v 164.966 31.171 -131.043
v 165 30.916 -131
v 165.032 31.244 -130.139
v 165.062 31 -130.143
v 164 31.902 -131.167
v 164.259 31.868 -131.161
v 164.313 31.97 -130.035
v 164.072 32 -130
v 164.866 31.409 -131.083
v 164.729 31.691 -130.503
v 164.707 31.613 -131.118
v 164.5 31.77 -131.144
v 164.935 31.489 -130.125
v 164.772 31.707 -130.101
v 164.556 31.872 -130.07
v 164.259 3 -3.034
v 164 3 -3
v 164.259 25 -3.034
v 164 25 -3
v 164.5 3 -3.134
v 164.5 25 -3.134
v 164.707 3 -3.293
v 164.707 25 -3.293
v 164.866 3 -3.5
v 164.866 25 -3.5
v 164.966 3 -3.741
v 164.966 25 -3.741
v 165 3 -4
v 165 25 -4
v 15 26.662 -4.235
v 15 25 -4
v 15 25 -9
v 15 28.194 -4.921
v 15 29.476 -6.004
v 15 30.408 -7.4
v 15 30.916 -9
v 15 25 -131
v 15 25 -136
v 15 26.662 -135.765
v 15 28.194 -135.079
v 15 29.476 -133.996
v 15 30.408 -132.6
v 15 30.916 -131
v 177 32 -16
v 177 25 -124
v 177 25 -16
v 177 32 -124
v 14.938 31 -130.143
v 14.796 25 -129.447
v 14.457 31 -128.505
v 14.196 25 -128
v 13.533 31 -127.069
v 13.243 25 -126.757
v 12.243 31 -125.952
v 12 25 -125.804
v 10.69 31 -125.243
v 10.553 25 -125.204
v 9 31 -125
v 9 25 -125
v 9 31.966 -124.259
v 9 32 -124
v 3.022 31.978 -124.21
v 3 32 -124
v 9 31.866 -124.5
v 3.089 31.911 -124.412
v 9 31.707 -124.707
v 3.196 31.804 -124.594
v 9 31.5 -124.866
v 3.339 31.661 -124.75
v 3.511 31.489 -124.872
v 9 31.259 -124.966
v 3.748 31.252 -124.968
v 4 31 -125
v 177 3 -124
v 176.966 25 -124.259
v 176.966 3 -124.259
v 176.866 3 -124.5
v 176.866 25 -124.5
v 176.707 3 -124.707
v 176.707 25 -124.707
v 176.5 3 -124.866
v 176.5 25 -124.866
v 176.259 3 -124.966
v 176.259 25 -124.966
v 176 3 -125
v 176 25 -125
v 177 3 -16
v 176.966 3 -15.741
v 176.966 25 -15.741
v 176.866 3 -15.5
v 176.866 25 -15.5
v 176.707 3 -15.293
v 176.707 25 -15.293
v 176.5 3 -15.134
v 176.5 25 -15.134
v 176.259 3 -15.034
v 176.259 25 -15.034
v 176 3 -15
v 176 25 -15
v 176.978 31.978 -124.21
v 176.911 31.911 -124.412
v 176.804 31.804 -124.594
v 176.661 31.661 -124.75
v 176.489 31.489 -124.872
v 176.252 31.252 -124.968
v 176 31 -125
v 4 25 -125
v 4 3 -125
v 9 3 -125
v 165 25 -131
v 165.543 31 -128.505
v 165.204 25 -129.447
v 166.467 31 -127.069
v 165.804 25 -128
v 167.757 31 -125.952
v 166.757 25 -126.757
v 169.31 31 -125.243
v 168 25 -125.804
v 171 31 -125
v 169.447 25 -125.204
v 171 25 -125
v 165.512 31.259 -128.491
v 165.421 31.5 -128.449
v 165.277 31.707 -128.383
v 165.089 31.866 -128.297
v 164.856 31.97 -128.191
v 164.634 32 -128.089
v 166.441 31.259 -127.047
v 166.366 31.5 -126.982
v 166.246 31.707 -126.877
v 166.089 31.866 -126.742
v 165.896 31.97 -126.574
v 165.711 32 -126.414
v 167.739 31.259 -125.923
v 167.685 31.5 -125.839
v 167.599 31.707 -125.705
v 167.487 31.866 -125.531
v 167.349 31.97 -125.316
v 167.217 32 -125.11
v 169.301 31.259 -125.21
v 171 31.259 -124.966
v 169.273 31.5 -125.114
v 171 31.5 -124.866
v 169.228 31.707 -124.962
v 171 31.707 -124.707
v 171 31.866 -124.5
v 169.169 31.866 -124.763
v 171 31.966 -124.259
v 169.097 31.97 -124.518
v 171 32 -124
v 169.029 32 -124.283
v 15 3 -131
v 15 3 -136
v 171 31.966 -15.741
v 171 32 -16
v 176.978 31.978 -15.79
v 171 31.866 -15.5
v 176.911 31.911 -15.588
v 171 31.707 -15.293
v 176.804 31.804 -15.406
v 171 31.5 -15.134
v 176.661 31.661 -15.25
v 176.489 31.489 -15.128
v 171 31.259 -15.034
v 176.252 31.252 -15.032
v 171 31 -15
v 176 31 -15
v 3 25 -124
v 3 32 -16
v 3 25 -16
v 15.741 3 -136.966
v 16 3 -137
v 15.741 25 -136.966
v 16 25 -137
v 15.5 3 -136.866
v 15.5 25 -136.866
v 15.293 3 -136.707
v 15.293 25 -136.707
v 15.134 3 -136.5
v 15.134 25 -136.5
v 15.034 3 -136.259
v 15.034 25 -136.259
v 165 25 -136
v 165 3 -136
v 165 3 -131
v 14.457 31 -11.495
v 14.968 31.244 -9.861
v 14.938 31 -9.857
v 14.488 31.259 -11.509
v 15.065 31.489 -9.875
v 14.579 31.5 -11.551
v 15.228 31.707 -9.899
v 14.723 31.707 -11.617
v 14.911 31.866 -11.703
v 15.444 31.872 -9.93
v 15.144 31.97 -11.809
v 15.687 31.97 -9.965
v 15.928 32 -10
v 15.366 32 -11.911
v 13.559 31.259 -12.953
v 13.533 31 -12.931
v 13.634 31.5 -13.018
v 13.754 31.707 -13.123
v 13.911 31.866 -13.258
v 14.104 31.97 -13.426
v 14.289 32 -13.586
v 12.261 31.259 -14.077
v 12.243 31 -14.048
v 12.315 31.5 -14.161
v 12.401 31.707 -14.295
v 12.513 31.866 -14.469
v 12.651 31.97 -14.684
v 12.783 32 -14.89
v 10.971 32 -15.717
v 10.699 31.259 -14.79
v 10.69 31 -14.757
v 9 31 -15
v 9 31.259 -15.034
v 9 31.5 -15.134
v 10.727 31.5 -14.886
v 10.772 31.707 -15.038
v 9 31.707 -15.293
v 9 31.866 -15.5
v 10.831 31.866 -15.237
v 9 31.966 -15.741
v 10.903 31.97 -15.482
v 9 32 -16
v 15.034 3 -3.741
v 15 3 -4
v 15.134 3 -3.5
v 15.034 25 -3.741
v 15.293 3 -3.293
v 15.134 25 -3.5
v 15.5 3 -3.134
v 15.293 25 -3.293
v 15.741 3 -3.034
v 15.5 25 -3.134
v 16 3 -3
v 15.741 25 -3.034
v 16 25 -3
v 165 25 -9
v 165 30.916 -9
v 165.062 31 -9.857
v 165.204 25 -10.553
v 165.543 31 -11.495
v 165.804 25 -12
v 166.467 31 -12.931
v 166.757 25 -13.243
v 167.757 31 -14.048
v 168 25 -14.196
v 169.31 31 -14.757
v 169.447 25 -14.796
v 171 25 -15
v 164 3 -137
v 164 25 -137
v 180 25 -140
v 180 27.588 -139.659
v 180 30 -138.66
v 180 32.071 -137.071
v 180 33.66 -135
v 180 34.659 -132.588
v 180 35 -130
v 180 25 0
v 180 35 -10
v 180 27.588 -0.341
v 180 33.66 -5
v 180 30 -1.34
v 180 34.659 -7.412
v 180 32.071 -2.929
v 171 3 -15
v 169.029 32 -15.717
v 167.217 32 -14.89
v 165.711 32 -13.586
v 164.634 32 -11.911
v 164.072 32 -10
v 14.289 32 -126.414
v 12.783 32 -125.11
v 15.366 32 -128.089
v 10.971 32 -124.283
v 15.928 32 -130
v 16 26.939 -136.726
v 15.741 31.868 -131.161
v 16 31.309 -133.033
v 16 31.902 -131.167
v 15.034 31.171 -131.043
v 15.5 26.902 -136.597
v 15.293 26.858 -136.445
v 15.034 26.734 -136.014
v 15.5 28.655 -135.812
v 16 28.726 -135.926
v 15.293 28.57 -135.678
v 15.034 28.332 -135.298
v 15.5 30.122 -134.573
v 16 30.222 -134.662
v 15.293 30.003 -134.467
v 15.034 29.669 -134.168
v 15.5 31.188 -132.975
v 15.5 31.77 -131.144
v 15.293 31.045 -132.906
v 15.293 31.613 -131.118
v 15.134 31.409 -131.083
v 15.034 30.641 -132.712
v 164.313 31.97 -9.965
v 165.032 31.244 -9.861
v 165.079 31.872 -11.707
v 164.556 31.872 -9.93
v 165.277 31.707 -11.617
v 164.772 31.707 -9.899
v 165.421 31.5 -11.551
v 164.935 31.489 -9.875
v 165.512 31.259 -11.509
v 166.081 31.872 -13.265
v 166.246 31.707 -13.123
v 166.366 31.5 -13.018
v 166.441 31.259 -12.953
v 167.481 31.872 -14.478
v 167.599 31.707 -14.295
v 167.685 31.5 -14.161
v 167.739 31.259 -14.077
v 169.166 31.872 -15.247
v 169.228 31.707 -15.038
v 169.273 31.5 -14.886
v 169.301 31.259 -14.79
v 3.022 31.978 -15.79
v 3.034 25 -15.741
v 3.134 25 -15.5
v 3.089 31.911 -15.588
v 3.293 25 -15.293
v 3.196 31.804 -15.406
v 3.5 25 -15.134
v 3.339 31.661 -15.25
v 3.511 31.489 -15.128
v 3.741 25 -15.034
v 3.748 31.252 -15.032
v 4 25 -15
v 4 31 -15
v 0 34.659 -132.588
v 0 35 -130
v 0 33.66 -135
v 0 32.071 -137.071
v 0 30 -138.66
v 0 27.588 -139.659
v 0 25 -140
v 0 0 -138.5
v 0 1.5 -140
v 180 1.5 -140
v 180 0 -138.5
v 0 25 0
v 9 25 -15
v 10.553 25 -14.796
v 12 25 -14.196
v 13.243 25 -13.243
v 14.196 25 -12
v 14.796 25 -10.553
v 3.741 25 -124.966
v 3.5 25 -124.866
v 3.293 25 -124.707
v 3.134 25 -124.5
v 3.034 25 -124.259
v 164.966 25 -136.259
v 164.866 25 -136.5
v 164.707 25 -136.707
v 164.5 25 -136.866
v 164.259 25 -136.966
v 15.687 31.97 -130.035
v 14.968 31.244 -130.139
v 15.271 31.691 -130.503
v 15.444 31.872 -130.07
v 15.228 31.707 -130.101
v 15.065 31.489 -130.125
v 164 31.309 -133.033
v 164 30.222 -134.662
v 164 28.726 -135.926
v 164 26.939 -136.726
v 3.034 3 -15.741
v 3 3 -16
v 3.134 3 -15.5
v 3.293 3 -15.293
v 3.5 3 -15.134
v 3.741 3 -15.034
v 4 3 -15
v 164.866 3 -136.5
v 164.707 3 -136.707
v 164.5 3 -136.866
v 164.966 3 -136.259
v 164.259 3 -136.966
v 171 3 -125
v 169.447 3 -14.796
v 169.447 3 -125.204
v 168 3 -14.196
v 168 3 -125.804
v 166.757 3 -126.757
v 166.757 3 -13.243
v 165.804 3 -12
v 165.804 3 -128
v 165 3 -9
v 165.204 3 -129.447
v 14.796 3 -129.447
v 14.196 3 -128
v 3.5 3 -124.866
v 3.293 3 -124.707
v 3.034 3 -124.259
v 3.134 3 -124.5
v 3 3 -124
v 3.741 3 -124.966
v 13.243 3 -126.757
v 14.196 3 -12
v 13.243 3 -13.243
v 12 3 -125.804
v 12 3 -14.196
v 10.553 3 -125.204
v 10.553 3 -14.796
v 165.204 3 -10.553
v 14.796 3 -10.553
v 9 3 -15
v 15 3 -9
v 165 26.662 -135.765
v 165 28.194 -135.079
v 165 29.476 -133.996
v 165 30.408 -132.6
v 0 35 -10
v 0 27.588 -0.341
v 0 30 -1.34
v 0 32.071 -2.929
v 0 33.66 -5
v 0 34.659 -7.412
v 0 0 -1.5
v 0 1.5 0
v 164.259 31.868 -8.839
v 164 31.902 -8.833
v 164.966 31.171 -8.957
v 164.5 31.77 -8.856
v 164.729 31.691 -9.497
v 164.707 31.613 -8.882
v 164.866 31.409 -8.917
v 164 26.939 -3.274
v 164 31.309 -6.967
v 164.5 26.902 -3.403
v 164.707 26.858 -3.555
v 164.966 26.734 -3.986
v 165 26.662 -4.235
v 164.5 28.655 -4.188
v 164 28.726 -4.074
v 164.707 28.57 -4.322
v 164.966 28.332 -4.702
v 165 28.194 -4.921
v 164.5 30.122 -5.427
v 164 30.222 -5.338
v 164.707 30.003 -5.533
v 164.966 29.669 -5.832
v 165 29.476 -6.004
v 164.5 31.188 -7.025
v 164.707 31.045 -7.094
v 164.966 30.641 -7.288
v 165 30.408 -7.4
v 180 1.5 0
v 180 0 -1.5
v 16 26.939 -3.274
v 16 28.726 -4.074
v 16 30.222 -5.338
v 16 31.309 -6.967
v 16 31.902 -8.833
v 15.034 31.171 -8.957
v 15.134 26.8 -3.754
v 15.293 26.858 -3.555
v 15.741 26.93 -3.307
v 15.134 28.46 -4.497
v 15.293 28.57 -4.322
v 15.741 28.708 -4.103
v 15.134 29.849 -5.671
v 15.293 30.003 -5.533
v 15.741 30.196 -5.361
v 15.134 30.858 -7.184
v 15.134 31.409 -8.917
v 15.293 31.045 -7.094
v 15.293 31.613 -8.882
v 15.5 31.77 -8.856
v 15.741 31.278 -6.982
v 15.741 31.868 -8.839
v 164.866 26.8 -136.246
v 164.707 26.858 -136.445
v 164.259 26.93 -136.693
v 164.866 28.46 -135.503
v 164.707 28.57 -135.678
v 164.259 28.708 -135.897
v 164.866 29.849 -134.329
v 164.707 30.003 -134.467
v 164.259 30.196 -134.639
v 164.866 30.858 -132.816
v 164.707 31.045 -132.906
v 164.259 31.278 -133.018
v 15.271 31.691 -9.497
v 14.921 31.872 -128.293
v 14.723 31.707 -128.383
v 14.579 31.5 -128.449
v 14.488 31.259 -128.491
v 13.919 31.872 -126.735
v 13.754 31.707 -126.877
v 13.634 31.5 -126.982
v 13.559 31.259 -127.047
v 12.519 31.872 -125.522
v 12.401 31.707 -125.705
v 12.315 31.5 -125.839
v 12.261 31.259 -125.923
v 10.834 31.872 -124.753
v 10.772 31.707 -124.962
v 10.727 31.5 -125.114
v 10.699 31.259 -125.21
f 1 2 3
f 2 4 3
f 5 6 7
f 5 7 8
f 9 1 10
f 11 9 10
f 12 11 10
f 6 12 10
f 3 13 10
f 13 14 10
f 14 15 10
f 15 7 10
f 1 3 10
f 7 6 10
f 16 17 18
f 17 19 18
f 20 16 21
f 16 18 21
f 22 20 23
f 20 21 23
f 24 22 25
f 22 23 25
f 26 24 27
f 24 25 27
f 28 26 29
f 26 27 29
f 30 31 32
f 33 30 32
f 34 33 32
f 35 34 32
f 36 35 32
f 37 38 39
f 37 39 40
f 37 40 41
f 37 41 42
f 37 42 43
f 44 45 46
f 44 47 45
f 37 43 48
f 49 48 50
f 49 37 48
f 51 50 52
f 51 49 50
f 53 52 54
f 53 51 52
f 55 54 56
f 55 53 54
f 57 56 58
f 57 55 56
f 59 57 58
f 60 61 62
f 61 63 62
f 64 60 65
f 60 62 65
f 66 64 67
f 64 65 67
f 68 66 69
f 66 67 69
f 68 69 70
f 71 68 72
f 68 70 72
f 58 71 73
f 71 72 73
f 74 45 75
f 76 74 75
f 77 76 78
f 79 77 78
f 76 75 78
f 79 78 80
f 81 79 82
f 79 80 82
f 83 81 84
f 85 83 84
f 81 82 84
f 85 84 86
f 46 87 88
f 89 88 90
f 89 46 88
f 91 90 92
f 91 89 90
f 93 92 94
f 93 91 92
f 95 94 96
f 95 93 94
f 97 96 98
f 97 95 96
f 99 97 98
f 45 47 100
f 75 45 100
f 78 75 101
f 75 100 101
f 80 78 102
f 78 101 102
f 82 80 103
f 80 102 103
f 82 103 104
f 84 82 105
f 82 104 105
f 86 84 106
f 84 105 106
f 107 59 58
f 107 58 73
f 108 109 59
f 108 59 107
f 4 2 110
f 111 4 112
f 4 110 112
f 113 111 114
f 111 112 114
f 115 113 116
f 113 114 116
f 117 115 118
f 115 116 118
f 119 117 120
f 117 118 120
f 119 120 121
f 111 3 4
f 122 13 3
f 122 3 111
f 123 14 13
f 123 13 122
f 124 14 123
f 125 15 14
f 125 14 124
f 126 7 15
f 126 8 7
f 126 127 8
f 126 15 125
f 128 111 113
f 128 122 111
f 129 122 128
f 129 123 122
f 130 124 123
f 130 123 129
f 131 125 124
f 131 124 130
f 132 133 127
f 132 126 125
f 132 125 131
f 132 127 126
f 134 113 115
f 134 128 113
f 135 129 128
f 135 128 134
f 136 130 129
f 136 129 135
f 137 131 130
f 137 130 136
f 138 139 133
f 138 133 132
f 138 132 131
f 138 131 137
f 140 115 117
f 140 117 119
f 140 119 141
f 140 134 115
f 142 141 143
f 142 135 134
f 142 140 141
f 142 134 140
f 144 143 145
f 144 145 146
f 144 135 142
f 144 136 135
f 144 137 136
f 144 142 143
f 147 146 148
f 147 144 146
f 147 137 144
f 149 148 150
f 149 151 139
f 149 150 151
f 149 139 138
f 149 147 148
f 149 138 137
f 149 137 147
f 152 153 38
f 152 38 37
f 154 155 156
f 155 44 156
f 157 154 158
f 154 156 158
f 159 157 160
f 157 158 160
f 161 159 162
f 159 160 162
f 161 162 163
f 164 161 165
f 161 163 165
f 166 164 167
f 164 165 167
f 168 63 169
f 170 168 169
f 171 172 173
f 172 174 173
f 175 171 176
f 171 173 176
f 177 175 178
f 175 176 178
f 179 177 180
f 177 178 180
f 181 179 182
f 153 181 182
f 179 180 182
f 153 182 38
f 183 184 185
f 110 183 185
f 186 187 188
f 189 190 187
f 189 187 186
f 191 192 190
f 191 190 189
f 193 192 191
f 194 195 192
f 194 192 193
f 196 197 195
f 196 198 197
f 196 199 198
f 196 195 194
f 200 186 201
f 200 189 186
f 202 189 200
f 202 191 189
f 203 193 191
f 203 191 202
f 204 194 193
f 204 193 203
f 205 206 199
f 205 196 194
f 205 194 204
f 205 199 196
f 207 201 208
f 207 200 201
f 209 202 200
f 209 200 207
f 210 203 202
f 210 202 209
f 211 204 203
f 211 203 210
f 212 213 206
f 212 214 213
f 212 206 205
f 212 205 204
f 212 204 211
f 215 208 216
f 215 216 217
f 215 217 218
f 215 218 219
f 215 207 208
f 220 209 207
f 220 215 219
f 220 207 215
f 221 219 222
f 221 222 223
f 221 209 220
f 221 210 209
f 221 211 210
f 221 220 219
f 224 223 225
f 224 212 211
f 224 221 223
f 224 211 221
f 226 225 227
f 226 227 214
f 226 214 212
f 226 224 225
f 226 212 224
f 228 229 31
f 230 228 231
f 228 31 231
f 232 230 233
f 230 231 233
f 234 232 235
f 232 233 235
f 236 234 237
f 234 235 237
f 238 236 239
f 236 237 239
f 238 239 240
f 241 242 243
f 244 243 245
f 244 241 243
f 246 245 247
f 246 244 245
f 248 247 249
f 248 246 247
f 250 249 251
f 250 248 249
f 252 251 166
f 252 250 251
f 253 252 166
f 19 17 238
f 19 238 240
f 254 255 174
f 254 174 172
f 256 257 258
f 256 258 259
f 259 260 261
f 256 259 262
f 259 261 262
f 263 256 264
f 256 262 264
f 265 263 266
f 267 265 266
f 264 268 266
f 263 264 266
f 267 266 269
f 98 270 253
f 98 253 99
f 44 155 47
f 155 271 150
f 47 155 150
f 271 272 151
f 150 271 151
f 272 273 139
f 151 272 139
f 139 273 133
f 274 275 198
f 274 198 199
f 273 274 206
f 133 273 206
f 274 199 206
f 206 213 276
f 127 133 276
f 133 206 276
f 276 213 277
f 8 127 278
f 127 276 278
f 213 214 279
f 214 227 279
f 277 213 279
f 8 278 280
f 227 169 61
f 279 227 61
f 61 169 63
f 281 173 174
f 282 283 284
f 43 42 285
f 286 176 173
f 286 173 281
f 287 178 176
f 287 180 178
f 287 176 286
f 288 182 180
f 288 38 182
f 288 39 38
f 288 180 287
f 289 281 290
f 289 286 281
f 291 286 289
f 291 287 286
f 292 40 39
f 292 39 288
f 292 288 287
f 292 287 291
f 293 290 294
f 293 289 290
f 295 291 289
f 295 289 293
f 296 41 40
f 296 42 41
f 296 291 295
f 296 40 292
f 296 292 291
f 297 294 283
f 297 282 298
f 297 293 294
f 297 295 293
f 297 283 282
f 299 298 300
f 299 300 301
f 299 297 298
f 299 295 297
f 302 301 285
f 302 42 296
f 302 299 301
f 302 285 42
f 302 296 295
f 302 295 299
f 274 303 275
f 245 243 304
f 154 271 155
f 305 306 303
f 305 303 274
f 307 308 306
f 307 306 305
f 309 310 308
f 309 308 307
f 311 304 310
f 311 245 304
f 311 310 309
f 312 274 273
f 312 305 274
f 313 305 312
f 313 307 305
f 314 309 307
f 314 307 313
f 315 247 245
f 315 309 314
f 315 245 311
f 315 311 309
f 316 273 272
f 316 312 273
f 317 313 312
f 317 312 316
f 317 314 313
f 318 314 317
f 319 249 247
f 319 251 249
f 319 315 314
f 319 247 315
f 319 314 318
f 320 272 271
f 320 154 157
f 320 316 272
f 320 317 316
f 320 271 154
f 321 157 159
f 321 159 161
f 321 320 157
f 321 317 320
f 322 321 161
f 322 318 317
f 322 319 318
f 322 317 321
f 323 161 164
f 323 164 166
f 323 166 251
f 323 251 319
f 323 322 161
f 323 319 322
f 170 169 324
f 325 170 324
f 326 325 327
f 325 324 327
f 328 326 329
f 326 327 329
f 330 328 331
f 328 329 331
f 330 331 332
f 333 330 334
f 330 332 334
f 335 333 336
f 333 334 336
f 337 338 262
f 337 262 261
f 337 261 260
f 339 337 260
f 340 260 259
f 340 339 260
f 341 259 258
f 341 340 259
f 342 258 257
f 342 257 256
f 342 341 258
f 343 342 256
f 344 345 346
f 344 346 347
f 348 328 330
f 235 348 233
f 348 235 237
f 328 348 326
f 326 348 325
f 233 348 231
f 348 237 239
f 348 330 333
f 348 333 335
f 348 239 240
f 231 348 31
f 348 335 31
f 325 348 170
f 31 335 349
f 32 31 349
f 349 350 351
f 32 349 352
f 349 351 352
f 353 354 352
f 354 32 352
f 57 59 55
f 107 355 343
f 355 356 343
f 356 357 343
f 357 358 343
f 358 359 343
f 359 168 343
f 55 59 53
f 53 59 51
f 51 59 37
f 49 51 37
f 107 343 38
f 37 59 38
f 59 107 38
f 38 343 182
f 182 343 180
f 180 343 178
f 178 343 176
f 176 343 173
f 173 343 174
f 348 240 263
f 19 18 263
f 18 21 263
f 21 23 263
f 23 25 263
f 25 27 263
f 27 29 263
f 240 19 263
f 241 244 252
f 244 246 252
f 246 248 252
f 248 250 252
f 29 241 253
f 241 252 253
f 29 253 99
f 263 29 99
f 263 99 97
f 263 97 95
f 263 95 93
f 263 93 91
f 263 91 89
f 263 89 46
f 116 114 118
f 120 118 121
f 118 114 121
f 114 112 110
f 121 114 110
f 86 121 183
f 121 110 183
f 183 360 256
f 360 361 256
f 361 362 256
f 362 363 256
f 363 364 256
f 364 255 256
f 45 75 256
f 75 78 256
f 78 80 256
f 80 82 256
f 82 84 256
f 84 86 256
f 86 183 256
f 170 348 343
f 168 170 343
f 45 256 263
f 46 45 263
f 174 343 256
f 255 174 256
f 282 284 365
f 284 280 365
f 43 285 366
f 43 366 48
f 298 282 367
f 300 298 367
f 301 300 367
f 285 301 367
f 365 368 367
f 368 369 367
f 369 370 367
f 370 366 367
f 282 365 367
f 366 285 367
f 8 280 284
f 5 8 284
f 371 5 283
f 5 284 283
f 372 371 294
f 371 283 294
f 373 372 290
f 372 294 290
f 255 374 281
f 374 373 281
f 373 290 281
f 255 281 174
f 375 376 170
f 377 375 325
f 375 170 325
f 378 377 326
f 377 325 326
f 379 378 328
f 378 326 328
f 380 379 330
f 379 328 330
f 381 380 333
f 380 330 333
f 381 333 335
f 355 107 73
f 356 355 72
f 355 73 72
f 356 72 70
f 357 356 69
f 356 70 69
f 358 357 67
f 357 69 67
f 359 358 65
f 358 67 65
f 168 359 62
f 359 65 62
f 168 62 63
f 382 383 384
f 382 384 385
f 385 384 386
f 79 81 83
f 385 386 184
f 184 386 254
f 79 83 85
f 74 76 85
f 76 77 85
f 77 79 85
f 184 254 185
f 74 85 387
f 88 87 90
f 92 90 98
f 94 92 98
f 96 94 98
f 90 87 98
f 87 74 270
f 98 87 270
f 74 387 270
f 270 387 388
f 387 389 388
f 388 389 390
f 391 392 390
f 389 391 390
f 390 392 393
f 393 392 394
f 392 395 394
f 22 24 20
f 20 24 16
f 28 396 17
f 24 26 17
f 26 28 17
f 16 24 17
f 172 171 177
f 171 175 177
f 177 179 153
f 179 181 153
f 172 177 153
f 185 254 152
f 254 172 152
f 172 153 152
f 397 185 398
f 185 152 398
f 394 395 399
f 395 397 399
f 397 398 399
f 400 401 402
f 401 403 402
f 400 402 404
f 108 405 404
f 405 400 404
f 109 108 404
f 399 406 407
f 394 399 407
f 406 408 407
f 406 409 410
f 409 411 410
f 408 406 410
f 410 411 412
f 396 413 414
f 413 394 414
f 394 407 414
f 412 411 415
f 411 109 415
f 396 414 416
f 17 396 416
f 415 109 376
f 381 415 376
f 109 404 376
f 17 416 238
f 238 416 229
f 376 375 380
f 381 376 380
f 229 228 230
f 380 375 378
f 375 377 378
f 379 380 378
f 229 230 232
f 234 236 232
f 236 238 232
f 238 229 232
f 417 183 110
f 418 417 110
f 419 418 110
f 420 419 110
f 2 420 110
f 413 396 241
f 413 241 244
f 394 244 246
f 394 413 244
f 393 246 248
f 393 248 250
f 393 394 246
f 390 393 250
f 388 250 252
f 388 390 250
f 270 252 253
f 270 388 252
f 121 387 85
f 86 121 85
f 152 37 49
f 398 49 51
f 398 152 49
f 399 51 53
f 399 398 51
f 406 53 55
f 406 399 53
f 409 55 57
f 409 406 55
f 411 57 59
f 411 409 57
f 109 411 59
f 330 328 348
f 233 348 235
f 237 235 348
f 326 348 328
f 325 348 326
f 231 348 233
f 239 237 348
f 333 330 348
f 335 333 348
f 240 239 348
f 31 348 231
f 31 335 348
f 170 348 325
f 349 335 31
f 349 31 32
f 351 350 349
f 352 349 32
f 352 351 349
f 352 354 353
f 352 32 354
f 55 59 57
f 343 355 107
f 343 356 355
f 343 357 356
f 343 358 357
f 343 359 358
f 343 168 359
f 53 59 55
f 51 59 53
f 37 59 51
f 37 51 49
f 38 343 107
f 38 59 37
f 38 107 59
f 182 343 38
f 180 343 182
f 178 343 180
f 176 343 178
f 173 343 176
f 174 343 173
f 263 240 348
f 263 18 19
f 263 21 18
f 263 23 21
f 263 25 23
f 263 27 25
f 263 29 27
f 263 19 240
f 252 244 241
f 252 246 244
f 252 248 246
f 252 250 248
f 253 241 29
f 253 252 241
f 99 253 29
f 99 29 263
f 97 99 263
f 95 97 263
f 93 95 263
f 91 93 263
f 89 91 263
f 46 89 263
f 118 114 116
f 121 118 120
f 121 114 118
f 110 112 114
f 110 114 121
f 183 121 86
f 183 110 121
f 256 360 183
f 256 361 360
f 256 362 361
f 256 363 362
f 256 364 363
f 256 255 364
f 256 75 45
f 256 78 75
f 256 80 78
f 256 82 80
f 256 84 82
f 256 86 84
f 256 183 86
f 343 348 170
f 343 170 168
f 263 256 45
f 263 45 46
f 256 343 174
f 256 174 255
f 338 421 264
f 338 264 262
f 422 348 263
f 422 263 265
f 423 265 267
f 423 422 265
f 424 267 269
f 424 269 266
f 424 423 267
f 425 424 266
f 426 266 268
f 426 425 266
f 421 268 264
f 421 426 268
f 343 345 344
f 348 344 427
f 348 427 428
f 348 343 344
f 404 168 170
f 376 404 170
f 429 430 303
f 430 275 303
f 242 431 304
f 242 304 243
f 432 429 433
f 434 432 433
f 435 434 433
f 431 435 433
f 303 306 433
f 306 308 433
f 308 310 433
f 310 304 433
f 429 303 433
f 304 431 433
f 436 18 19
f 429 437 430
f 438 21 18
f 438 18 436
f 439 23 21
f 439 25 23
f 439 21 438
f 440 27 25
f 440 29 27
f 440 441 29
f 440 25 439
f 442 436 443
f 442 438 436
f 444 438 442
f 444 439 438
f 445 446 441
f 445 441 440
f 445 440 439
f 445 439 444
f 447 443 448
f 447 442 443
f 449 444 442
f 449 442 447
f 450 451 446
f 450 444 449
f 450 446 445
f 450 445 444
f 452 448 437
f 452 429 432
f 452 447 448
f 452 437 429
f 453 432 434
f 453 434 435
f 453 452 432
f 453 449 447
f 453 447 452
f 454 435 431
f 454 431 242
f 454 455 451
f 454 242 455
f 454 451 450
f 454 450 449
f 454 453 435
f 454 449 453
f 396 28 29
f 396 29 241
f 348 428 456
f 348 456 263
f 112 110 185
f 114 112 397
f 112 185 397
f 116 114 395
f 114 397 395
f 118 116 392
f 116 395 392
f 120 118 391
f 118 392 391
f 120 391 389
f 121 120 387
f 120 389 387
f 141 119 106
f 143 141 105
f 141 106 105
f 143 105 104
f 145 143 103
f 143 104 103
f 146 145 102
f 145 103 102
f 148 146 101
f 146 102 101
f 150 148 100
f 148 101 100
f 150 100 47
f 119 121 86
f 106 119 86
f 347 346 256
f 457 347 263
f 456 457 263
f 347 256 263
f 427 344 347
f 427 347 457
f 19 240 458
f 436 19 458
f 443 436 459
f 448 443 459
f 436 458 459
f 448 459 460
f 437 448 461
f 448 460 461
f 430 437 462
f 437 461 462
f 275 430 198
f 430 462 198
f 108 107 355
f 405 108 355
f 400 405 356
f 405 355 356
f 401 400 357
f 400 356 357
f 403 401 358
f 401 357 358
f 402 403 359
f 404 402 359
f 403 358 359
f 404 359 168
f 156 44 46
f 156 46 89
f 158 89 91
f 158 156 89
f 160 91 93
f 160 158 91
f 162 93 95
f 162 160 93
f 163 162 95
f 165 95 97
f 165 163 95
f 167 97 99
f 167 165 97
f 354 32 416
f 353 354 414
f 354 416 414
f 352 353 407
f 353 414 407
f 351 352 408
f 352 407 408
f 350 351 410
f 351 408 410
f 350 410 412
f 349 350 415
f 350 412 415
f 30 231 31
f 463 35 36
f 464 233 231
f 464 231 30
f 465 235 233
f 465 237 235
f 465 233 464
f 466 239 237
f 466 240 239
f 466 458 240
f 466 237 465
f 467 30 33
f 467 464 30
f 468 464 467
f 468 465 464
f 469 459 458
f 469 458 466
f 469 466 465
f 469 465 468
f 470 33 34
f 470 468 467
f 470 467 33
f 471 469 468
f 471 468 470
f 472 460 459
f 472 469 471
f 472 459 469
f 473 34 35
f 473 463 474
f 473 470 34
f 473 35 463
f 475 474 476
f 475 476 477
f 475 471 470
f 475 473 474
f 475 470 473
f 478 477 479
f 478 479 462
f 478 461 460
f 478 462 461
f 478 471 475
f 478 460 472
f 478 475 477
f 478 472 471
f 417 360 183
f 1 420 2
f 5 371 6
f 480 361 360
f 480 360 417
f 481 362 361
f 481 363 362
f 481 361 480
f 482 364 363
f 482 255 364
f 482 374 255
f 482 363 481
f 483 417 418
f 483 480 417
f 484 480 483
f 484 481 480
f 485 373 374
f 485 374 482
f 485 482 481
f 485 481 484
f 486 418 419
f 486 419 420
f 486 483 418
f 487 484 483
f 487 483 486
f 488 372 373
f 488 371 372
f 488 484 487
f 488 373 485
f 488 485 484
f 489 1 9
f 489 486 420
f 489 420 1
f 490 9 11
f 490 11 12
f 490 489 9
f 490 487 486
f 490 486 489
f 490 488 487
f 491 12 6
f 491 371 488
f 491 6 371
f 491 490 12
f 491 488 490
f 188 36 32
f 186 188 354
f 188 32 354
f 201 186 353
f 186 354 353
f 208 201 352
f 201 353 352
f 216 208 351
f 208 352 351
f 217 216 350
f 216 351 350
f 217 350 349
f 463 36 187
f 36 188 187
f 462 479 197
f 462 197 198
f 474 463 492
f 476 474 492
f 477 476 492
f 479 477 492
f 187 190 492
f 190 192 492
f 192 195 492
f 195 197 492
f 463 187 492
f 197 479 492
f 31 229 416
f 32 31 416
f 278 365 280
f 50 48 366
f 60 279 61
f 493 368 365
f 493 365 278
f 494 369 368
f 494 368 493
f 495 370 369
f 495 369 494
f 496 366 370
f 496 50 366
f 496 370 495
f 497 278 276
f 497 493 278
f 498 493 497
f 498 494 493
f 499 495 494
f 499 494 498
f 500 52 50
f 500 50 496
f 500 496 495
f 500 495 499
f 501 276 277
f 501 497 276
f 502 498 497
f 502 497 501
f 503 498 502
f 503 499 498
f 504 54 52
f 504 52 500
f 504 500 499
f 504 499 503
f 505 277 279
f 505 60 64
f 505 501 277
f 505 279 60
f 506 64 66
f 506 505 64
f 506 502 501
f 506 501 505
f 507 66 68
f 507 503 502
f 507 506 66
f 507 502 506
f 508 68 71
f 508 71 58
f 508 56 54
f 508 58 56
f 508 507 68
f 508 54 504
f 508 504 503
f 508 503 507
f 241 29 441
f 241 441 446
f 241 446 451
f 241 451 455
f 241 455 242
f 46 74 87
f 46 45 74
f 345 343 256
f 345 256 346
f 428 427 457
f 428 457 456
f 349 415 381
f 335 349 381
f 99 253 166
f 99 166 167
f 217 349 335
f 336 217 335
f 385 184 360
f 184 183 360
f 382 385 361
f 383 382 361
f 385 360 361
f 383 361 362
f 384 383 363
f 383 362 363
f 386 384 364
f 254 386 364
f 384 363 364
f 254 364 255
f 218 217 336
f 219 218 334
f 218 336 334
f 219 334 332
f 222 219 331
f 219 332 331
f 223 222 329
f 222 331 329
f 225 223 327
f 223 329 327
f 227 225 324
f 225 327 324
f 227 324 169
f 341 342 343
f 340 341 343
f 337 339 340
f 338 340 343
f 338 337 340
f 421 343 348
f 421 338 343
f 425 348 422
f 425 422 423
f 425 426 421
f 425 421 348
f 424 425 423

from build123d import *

# Parameters (mm, degrees)
CASEEXTRUDE_DEPTH      = 180
SHELL1_T               = 3
SCREWBOSSEXTRUDE_REACH = 232.269
INTERNALFILLET_R       = 1


# Read off the part's stored shape, not the designer's step: Split3
with BuildPart() as part:
    # Sketch1 → CaseExtrude (new body)
    with BuildSketch(Plane(origin=(0, 0, 0), x_dir=(0, 0, -1), z_dir=(1, 0, 0))):
        with BuildLine():
            Line((1.5, 0), (0, 1.5))
            Line((0, 1.5), (0, 25))
            ThreePointArc((0, 25), (2.928932188, 32.071067812), (10, 35))
            Line((10, 35), (130, 35))
            ThreePointArc((130, 35), (137.071067812, 32.071067812), (140, 25))
            Line((140, 25), (140, 1.5))
            Line((140, 1.5), (138.5, 0))
            Line((138.5, 0), (1.5, 0))
        make_face()
    extrude(amount=CASEEXTRUDE_DEPTH)

    # Shell1 (no face opened: a closed hollow body)
    add(offset(amount=-SHELL1_T, mode=Mode.PRIVATE), mode=Mode.SUBTRACT)

    # Sketch5 → ScrewBossExtrude (add, up to next)
    with BuildSketch(Plane(origin=(0, 3, 0), x_dir=(1, 0, 0), z_dir=(0, 1, 0)), mode=Mode.PRIVATE) as screwbossextrude_sk1:
        with BuildLine():
            Line((3, 137), (15, 137))
            Line((15, 137), (15, 131))
            ThreePointArc((15, 131), (13.242640687, 126.757359313), (9, 125))
            Line((9, 125), (3, 125))
            Line((3, 125), (3, 137))
        make_face()
    screwbossextrude_tool1 = extrude(screwbossextrude_sk1.sketch, amount=SCREWBOSSEXTRUDE_REACH, mode=Mode.PRIVATE) - part.part
    # Sketch5 → ScrewBossExtrude (add, up to next)
    with BuildSketch(Plane(origin=(0, 3, 0), x_dir=(1, 0, 0), z_dir=(0, 1, 0)), mode=Mode.PRIVATE) as screwbossextrude_sk2:
        with BuildLine():
            Line((3, 3), (15, 3))
            Line((15, 3), (15, 9))
            ThreePointArc((15, 9), (13.242640687, 13.242640687), (9, 15))
            Line((9, 15), (3, 15))
            Line((3, 15), (3, 3))
        make_face()
    screwbossextrude_tool2 = extrude(screwbossextrude_sk2.sketch, amount=SCREWBOSSEXTRUDE_REACH, mode=Mode.PRIVATE) - part.part
    # Sketch5 → ScrewBossExtrude (add, up to next)
    with BuildSketch(Plane(origin=(0, 3, 0), x_dir=(1, 0, 0), z_dir=(0, 1, 0)), mode=Mode.PRIVATE) as screwbossextrude_sk3:
        with BuildLine():
            Line((177, 3), (165, 3))
            Line((165, 3), (165, 9))
            ThreePointArc((165, 9), (166.757359313, 13.242640687), (171, 15))
            Line((171, 15), (177, 15))
            Line((177, 15), (177, 3))
        make_face()
    screwbossextrude_tool3 = extrude(screwbossextrude_sk3.sketch, amount=SCREWBOSSEXTRUDE_REACH, mode=Mode.PRIVATE) - part.part
    # Sketch5 → ScrewBossExtrude (add, up to next)
    with BuildSketch(Plane(origin=(0, 3, 0), x_dir=(1, 0, 0), z_dir=(0, 1, 0)), mode=Mode.PRIVATE) as screwbossextrude_sk4:
        with BuildLine():
            Line((177, 137), (165, 137))
            Line((165, 137), (165, 131))
            ThreePointArc((165, 131), (166.757359313, 126.757359313), (171, 125))
            Line((171, 125), (177, 125))
            Line((177, 125), (177, 137))
        make_face()
    screwbossextrude_tool4 = extrude(screwbossextrude_sk4.sketch, amount=SCREWBOSSEXTRUDE_REACH, mode=Mode.PRIVATE) - part.part
    add(screwbossextrude_tool1.solids().sort_by_distance((8.735827, 3, -131.264173))[0])
    add(screwbossextrude_tool2.solids().sort_by_distance((8.735827, 3, -8.735827))[0])
    add(screwbossextrude_tool3.solids().sort_by_distance((171.264173, 3, -8.735827))[0])
    add(screwbossextrude_tool4.solids().sort_by_distance((171.264173, 3, -131.264173))[0])

    # InternalFillet
    internalfillet_edges = [part.edges().sort_by_distance(p)[0] for p in [
        (177, 17.5, -125),
        (174, 32, -125),
        (167.127016654, 32, -126.417424305),
        (165.020908991, 31.982153697, -130.499529468),
        (165, 29.582575695, -135.291502622),
        (165, 14, -137),
        (165, 14, -3),
        (165, 29.582575695, -4.708497378),
        (165.020908991, 31.982153697, -9.500470532),
        (167.127016654, 32, -13.582575695),
        (174, 32, -15),
        (177, 17.5, -15),
        (3, 17.5, -15),
        (6, 32, -15),
        (12.872983346, 32, -13.582575695),
        (14.979091009, 31.982153697, -9.500470532),
        (15, 29.582575695, -4.708497378),
        (15, 14, -3),
        (15, 14, -137),
        (15, 29.582575695, -135.291502622),
        (14.979091009, 31.982153697, -130.499529468),
        (12.872983346, 32, -126.417424305),
        (6, 32, -125),
        (3, 17.5, -125),
    ]]
    fillet(internalfillet_edges, radius=INTERNALFILLET_R)


with BuildPart() as body_2:
    # Split3: the piece on the far side of the plane
    add(part.part)
    split(bisect_by=Plane(origin=(0, 25, 0), x_dir=(1, 0, 0), z_dir=(0, 1, 0)), keep=Keep.BOTTOM)


with BuildPart() as part_1:
    add(part.part)

    # Split3
    split(bisect_by=Plane(origin=(0, 25, 0), x_dir=(1, 0, 0), z_dir=(0, 1, 0)), keep=Keep.TOP)


solid = Compound([body_2.part, part_1.part])
